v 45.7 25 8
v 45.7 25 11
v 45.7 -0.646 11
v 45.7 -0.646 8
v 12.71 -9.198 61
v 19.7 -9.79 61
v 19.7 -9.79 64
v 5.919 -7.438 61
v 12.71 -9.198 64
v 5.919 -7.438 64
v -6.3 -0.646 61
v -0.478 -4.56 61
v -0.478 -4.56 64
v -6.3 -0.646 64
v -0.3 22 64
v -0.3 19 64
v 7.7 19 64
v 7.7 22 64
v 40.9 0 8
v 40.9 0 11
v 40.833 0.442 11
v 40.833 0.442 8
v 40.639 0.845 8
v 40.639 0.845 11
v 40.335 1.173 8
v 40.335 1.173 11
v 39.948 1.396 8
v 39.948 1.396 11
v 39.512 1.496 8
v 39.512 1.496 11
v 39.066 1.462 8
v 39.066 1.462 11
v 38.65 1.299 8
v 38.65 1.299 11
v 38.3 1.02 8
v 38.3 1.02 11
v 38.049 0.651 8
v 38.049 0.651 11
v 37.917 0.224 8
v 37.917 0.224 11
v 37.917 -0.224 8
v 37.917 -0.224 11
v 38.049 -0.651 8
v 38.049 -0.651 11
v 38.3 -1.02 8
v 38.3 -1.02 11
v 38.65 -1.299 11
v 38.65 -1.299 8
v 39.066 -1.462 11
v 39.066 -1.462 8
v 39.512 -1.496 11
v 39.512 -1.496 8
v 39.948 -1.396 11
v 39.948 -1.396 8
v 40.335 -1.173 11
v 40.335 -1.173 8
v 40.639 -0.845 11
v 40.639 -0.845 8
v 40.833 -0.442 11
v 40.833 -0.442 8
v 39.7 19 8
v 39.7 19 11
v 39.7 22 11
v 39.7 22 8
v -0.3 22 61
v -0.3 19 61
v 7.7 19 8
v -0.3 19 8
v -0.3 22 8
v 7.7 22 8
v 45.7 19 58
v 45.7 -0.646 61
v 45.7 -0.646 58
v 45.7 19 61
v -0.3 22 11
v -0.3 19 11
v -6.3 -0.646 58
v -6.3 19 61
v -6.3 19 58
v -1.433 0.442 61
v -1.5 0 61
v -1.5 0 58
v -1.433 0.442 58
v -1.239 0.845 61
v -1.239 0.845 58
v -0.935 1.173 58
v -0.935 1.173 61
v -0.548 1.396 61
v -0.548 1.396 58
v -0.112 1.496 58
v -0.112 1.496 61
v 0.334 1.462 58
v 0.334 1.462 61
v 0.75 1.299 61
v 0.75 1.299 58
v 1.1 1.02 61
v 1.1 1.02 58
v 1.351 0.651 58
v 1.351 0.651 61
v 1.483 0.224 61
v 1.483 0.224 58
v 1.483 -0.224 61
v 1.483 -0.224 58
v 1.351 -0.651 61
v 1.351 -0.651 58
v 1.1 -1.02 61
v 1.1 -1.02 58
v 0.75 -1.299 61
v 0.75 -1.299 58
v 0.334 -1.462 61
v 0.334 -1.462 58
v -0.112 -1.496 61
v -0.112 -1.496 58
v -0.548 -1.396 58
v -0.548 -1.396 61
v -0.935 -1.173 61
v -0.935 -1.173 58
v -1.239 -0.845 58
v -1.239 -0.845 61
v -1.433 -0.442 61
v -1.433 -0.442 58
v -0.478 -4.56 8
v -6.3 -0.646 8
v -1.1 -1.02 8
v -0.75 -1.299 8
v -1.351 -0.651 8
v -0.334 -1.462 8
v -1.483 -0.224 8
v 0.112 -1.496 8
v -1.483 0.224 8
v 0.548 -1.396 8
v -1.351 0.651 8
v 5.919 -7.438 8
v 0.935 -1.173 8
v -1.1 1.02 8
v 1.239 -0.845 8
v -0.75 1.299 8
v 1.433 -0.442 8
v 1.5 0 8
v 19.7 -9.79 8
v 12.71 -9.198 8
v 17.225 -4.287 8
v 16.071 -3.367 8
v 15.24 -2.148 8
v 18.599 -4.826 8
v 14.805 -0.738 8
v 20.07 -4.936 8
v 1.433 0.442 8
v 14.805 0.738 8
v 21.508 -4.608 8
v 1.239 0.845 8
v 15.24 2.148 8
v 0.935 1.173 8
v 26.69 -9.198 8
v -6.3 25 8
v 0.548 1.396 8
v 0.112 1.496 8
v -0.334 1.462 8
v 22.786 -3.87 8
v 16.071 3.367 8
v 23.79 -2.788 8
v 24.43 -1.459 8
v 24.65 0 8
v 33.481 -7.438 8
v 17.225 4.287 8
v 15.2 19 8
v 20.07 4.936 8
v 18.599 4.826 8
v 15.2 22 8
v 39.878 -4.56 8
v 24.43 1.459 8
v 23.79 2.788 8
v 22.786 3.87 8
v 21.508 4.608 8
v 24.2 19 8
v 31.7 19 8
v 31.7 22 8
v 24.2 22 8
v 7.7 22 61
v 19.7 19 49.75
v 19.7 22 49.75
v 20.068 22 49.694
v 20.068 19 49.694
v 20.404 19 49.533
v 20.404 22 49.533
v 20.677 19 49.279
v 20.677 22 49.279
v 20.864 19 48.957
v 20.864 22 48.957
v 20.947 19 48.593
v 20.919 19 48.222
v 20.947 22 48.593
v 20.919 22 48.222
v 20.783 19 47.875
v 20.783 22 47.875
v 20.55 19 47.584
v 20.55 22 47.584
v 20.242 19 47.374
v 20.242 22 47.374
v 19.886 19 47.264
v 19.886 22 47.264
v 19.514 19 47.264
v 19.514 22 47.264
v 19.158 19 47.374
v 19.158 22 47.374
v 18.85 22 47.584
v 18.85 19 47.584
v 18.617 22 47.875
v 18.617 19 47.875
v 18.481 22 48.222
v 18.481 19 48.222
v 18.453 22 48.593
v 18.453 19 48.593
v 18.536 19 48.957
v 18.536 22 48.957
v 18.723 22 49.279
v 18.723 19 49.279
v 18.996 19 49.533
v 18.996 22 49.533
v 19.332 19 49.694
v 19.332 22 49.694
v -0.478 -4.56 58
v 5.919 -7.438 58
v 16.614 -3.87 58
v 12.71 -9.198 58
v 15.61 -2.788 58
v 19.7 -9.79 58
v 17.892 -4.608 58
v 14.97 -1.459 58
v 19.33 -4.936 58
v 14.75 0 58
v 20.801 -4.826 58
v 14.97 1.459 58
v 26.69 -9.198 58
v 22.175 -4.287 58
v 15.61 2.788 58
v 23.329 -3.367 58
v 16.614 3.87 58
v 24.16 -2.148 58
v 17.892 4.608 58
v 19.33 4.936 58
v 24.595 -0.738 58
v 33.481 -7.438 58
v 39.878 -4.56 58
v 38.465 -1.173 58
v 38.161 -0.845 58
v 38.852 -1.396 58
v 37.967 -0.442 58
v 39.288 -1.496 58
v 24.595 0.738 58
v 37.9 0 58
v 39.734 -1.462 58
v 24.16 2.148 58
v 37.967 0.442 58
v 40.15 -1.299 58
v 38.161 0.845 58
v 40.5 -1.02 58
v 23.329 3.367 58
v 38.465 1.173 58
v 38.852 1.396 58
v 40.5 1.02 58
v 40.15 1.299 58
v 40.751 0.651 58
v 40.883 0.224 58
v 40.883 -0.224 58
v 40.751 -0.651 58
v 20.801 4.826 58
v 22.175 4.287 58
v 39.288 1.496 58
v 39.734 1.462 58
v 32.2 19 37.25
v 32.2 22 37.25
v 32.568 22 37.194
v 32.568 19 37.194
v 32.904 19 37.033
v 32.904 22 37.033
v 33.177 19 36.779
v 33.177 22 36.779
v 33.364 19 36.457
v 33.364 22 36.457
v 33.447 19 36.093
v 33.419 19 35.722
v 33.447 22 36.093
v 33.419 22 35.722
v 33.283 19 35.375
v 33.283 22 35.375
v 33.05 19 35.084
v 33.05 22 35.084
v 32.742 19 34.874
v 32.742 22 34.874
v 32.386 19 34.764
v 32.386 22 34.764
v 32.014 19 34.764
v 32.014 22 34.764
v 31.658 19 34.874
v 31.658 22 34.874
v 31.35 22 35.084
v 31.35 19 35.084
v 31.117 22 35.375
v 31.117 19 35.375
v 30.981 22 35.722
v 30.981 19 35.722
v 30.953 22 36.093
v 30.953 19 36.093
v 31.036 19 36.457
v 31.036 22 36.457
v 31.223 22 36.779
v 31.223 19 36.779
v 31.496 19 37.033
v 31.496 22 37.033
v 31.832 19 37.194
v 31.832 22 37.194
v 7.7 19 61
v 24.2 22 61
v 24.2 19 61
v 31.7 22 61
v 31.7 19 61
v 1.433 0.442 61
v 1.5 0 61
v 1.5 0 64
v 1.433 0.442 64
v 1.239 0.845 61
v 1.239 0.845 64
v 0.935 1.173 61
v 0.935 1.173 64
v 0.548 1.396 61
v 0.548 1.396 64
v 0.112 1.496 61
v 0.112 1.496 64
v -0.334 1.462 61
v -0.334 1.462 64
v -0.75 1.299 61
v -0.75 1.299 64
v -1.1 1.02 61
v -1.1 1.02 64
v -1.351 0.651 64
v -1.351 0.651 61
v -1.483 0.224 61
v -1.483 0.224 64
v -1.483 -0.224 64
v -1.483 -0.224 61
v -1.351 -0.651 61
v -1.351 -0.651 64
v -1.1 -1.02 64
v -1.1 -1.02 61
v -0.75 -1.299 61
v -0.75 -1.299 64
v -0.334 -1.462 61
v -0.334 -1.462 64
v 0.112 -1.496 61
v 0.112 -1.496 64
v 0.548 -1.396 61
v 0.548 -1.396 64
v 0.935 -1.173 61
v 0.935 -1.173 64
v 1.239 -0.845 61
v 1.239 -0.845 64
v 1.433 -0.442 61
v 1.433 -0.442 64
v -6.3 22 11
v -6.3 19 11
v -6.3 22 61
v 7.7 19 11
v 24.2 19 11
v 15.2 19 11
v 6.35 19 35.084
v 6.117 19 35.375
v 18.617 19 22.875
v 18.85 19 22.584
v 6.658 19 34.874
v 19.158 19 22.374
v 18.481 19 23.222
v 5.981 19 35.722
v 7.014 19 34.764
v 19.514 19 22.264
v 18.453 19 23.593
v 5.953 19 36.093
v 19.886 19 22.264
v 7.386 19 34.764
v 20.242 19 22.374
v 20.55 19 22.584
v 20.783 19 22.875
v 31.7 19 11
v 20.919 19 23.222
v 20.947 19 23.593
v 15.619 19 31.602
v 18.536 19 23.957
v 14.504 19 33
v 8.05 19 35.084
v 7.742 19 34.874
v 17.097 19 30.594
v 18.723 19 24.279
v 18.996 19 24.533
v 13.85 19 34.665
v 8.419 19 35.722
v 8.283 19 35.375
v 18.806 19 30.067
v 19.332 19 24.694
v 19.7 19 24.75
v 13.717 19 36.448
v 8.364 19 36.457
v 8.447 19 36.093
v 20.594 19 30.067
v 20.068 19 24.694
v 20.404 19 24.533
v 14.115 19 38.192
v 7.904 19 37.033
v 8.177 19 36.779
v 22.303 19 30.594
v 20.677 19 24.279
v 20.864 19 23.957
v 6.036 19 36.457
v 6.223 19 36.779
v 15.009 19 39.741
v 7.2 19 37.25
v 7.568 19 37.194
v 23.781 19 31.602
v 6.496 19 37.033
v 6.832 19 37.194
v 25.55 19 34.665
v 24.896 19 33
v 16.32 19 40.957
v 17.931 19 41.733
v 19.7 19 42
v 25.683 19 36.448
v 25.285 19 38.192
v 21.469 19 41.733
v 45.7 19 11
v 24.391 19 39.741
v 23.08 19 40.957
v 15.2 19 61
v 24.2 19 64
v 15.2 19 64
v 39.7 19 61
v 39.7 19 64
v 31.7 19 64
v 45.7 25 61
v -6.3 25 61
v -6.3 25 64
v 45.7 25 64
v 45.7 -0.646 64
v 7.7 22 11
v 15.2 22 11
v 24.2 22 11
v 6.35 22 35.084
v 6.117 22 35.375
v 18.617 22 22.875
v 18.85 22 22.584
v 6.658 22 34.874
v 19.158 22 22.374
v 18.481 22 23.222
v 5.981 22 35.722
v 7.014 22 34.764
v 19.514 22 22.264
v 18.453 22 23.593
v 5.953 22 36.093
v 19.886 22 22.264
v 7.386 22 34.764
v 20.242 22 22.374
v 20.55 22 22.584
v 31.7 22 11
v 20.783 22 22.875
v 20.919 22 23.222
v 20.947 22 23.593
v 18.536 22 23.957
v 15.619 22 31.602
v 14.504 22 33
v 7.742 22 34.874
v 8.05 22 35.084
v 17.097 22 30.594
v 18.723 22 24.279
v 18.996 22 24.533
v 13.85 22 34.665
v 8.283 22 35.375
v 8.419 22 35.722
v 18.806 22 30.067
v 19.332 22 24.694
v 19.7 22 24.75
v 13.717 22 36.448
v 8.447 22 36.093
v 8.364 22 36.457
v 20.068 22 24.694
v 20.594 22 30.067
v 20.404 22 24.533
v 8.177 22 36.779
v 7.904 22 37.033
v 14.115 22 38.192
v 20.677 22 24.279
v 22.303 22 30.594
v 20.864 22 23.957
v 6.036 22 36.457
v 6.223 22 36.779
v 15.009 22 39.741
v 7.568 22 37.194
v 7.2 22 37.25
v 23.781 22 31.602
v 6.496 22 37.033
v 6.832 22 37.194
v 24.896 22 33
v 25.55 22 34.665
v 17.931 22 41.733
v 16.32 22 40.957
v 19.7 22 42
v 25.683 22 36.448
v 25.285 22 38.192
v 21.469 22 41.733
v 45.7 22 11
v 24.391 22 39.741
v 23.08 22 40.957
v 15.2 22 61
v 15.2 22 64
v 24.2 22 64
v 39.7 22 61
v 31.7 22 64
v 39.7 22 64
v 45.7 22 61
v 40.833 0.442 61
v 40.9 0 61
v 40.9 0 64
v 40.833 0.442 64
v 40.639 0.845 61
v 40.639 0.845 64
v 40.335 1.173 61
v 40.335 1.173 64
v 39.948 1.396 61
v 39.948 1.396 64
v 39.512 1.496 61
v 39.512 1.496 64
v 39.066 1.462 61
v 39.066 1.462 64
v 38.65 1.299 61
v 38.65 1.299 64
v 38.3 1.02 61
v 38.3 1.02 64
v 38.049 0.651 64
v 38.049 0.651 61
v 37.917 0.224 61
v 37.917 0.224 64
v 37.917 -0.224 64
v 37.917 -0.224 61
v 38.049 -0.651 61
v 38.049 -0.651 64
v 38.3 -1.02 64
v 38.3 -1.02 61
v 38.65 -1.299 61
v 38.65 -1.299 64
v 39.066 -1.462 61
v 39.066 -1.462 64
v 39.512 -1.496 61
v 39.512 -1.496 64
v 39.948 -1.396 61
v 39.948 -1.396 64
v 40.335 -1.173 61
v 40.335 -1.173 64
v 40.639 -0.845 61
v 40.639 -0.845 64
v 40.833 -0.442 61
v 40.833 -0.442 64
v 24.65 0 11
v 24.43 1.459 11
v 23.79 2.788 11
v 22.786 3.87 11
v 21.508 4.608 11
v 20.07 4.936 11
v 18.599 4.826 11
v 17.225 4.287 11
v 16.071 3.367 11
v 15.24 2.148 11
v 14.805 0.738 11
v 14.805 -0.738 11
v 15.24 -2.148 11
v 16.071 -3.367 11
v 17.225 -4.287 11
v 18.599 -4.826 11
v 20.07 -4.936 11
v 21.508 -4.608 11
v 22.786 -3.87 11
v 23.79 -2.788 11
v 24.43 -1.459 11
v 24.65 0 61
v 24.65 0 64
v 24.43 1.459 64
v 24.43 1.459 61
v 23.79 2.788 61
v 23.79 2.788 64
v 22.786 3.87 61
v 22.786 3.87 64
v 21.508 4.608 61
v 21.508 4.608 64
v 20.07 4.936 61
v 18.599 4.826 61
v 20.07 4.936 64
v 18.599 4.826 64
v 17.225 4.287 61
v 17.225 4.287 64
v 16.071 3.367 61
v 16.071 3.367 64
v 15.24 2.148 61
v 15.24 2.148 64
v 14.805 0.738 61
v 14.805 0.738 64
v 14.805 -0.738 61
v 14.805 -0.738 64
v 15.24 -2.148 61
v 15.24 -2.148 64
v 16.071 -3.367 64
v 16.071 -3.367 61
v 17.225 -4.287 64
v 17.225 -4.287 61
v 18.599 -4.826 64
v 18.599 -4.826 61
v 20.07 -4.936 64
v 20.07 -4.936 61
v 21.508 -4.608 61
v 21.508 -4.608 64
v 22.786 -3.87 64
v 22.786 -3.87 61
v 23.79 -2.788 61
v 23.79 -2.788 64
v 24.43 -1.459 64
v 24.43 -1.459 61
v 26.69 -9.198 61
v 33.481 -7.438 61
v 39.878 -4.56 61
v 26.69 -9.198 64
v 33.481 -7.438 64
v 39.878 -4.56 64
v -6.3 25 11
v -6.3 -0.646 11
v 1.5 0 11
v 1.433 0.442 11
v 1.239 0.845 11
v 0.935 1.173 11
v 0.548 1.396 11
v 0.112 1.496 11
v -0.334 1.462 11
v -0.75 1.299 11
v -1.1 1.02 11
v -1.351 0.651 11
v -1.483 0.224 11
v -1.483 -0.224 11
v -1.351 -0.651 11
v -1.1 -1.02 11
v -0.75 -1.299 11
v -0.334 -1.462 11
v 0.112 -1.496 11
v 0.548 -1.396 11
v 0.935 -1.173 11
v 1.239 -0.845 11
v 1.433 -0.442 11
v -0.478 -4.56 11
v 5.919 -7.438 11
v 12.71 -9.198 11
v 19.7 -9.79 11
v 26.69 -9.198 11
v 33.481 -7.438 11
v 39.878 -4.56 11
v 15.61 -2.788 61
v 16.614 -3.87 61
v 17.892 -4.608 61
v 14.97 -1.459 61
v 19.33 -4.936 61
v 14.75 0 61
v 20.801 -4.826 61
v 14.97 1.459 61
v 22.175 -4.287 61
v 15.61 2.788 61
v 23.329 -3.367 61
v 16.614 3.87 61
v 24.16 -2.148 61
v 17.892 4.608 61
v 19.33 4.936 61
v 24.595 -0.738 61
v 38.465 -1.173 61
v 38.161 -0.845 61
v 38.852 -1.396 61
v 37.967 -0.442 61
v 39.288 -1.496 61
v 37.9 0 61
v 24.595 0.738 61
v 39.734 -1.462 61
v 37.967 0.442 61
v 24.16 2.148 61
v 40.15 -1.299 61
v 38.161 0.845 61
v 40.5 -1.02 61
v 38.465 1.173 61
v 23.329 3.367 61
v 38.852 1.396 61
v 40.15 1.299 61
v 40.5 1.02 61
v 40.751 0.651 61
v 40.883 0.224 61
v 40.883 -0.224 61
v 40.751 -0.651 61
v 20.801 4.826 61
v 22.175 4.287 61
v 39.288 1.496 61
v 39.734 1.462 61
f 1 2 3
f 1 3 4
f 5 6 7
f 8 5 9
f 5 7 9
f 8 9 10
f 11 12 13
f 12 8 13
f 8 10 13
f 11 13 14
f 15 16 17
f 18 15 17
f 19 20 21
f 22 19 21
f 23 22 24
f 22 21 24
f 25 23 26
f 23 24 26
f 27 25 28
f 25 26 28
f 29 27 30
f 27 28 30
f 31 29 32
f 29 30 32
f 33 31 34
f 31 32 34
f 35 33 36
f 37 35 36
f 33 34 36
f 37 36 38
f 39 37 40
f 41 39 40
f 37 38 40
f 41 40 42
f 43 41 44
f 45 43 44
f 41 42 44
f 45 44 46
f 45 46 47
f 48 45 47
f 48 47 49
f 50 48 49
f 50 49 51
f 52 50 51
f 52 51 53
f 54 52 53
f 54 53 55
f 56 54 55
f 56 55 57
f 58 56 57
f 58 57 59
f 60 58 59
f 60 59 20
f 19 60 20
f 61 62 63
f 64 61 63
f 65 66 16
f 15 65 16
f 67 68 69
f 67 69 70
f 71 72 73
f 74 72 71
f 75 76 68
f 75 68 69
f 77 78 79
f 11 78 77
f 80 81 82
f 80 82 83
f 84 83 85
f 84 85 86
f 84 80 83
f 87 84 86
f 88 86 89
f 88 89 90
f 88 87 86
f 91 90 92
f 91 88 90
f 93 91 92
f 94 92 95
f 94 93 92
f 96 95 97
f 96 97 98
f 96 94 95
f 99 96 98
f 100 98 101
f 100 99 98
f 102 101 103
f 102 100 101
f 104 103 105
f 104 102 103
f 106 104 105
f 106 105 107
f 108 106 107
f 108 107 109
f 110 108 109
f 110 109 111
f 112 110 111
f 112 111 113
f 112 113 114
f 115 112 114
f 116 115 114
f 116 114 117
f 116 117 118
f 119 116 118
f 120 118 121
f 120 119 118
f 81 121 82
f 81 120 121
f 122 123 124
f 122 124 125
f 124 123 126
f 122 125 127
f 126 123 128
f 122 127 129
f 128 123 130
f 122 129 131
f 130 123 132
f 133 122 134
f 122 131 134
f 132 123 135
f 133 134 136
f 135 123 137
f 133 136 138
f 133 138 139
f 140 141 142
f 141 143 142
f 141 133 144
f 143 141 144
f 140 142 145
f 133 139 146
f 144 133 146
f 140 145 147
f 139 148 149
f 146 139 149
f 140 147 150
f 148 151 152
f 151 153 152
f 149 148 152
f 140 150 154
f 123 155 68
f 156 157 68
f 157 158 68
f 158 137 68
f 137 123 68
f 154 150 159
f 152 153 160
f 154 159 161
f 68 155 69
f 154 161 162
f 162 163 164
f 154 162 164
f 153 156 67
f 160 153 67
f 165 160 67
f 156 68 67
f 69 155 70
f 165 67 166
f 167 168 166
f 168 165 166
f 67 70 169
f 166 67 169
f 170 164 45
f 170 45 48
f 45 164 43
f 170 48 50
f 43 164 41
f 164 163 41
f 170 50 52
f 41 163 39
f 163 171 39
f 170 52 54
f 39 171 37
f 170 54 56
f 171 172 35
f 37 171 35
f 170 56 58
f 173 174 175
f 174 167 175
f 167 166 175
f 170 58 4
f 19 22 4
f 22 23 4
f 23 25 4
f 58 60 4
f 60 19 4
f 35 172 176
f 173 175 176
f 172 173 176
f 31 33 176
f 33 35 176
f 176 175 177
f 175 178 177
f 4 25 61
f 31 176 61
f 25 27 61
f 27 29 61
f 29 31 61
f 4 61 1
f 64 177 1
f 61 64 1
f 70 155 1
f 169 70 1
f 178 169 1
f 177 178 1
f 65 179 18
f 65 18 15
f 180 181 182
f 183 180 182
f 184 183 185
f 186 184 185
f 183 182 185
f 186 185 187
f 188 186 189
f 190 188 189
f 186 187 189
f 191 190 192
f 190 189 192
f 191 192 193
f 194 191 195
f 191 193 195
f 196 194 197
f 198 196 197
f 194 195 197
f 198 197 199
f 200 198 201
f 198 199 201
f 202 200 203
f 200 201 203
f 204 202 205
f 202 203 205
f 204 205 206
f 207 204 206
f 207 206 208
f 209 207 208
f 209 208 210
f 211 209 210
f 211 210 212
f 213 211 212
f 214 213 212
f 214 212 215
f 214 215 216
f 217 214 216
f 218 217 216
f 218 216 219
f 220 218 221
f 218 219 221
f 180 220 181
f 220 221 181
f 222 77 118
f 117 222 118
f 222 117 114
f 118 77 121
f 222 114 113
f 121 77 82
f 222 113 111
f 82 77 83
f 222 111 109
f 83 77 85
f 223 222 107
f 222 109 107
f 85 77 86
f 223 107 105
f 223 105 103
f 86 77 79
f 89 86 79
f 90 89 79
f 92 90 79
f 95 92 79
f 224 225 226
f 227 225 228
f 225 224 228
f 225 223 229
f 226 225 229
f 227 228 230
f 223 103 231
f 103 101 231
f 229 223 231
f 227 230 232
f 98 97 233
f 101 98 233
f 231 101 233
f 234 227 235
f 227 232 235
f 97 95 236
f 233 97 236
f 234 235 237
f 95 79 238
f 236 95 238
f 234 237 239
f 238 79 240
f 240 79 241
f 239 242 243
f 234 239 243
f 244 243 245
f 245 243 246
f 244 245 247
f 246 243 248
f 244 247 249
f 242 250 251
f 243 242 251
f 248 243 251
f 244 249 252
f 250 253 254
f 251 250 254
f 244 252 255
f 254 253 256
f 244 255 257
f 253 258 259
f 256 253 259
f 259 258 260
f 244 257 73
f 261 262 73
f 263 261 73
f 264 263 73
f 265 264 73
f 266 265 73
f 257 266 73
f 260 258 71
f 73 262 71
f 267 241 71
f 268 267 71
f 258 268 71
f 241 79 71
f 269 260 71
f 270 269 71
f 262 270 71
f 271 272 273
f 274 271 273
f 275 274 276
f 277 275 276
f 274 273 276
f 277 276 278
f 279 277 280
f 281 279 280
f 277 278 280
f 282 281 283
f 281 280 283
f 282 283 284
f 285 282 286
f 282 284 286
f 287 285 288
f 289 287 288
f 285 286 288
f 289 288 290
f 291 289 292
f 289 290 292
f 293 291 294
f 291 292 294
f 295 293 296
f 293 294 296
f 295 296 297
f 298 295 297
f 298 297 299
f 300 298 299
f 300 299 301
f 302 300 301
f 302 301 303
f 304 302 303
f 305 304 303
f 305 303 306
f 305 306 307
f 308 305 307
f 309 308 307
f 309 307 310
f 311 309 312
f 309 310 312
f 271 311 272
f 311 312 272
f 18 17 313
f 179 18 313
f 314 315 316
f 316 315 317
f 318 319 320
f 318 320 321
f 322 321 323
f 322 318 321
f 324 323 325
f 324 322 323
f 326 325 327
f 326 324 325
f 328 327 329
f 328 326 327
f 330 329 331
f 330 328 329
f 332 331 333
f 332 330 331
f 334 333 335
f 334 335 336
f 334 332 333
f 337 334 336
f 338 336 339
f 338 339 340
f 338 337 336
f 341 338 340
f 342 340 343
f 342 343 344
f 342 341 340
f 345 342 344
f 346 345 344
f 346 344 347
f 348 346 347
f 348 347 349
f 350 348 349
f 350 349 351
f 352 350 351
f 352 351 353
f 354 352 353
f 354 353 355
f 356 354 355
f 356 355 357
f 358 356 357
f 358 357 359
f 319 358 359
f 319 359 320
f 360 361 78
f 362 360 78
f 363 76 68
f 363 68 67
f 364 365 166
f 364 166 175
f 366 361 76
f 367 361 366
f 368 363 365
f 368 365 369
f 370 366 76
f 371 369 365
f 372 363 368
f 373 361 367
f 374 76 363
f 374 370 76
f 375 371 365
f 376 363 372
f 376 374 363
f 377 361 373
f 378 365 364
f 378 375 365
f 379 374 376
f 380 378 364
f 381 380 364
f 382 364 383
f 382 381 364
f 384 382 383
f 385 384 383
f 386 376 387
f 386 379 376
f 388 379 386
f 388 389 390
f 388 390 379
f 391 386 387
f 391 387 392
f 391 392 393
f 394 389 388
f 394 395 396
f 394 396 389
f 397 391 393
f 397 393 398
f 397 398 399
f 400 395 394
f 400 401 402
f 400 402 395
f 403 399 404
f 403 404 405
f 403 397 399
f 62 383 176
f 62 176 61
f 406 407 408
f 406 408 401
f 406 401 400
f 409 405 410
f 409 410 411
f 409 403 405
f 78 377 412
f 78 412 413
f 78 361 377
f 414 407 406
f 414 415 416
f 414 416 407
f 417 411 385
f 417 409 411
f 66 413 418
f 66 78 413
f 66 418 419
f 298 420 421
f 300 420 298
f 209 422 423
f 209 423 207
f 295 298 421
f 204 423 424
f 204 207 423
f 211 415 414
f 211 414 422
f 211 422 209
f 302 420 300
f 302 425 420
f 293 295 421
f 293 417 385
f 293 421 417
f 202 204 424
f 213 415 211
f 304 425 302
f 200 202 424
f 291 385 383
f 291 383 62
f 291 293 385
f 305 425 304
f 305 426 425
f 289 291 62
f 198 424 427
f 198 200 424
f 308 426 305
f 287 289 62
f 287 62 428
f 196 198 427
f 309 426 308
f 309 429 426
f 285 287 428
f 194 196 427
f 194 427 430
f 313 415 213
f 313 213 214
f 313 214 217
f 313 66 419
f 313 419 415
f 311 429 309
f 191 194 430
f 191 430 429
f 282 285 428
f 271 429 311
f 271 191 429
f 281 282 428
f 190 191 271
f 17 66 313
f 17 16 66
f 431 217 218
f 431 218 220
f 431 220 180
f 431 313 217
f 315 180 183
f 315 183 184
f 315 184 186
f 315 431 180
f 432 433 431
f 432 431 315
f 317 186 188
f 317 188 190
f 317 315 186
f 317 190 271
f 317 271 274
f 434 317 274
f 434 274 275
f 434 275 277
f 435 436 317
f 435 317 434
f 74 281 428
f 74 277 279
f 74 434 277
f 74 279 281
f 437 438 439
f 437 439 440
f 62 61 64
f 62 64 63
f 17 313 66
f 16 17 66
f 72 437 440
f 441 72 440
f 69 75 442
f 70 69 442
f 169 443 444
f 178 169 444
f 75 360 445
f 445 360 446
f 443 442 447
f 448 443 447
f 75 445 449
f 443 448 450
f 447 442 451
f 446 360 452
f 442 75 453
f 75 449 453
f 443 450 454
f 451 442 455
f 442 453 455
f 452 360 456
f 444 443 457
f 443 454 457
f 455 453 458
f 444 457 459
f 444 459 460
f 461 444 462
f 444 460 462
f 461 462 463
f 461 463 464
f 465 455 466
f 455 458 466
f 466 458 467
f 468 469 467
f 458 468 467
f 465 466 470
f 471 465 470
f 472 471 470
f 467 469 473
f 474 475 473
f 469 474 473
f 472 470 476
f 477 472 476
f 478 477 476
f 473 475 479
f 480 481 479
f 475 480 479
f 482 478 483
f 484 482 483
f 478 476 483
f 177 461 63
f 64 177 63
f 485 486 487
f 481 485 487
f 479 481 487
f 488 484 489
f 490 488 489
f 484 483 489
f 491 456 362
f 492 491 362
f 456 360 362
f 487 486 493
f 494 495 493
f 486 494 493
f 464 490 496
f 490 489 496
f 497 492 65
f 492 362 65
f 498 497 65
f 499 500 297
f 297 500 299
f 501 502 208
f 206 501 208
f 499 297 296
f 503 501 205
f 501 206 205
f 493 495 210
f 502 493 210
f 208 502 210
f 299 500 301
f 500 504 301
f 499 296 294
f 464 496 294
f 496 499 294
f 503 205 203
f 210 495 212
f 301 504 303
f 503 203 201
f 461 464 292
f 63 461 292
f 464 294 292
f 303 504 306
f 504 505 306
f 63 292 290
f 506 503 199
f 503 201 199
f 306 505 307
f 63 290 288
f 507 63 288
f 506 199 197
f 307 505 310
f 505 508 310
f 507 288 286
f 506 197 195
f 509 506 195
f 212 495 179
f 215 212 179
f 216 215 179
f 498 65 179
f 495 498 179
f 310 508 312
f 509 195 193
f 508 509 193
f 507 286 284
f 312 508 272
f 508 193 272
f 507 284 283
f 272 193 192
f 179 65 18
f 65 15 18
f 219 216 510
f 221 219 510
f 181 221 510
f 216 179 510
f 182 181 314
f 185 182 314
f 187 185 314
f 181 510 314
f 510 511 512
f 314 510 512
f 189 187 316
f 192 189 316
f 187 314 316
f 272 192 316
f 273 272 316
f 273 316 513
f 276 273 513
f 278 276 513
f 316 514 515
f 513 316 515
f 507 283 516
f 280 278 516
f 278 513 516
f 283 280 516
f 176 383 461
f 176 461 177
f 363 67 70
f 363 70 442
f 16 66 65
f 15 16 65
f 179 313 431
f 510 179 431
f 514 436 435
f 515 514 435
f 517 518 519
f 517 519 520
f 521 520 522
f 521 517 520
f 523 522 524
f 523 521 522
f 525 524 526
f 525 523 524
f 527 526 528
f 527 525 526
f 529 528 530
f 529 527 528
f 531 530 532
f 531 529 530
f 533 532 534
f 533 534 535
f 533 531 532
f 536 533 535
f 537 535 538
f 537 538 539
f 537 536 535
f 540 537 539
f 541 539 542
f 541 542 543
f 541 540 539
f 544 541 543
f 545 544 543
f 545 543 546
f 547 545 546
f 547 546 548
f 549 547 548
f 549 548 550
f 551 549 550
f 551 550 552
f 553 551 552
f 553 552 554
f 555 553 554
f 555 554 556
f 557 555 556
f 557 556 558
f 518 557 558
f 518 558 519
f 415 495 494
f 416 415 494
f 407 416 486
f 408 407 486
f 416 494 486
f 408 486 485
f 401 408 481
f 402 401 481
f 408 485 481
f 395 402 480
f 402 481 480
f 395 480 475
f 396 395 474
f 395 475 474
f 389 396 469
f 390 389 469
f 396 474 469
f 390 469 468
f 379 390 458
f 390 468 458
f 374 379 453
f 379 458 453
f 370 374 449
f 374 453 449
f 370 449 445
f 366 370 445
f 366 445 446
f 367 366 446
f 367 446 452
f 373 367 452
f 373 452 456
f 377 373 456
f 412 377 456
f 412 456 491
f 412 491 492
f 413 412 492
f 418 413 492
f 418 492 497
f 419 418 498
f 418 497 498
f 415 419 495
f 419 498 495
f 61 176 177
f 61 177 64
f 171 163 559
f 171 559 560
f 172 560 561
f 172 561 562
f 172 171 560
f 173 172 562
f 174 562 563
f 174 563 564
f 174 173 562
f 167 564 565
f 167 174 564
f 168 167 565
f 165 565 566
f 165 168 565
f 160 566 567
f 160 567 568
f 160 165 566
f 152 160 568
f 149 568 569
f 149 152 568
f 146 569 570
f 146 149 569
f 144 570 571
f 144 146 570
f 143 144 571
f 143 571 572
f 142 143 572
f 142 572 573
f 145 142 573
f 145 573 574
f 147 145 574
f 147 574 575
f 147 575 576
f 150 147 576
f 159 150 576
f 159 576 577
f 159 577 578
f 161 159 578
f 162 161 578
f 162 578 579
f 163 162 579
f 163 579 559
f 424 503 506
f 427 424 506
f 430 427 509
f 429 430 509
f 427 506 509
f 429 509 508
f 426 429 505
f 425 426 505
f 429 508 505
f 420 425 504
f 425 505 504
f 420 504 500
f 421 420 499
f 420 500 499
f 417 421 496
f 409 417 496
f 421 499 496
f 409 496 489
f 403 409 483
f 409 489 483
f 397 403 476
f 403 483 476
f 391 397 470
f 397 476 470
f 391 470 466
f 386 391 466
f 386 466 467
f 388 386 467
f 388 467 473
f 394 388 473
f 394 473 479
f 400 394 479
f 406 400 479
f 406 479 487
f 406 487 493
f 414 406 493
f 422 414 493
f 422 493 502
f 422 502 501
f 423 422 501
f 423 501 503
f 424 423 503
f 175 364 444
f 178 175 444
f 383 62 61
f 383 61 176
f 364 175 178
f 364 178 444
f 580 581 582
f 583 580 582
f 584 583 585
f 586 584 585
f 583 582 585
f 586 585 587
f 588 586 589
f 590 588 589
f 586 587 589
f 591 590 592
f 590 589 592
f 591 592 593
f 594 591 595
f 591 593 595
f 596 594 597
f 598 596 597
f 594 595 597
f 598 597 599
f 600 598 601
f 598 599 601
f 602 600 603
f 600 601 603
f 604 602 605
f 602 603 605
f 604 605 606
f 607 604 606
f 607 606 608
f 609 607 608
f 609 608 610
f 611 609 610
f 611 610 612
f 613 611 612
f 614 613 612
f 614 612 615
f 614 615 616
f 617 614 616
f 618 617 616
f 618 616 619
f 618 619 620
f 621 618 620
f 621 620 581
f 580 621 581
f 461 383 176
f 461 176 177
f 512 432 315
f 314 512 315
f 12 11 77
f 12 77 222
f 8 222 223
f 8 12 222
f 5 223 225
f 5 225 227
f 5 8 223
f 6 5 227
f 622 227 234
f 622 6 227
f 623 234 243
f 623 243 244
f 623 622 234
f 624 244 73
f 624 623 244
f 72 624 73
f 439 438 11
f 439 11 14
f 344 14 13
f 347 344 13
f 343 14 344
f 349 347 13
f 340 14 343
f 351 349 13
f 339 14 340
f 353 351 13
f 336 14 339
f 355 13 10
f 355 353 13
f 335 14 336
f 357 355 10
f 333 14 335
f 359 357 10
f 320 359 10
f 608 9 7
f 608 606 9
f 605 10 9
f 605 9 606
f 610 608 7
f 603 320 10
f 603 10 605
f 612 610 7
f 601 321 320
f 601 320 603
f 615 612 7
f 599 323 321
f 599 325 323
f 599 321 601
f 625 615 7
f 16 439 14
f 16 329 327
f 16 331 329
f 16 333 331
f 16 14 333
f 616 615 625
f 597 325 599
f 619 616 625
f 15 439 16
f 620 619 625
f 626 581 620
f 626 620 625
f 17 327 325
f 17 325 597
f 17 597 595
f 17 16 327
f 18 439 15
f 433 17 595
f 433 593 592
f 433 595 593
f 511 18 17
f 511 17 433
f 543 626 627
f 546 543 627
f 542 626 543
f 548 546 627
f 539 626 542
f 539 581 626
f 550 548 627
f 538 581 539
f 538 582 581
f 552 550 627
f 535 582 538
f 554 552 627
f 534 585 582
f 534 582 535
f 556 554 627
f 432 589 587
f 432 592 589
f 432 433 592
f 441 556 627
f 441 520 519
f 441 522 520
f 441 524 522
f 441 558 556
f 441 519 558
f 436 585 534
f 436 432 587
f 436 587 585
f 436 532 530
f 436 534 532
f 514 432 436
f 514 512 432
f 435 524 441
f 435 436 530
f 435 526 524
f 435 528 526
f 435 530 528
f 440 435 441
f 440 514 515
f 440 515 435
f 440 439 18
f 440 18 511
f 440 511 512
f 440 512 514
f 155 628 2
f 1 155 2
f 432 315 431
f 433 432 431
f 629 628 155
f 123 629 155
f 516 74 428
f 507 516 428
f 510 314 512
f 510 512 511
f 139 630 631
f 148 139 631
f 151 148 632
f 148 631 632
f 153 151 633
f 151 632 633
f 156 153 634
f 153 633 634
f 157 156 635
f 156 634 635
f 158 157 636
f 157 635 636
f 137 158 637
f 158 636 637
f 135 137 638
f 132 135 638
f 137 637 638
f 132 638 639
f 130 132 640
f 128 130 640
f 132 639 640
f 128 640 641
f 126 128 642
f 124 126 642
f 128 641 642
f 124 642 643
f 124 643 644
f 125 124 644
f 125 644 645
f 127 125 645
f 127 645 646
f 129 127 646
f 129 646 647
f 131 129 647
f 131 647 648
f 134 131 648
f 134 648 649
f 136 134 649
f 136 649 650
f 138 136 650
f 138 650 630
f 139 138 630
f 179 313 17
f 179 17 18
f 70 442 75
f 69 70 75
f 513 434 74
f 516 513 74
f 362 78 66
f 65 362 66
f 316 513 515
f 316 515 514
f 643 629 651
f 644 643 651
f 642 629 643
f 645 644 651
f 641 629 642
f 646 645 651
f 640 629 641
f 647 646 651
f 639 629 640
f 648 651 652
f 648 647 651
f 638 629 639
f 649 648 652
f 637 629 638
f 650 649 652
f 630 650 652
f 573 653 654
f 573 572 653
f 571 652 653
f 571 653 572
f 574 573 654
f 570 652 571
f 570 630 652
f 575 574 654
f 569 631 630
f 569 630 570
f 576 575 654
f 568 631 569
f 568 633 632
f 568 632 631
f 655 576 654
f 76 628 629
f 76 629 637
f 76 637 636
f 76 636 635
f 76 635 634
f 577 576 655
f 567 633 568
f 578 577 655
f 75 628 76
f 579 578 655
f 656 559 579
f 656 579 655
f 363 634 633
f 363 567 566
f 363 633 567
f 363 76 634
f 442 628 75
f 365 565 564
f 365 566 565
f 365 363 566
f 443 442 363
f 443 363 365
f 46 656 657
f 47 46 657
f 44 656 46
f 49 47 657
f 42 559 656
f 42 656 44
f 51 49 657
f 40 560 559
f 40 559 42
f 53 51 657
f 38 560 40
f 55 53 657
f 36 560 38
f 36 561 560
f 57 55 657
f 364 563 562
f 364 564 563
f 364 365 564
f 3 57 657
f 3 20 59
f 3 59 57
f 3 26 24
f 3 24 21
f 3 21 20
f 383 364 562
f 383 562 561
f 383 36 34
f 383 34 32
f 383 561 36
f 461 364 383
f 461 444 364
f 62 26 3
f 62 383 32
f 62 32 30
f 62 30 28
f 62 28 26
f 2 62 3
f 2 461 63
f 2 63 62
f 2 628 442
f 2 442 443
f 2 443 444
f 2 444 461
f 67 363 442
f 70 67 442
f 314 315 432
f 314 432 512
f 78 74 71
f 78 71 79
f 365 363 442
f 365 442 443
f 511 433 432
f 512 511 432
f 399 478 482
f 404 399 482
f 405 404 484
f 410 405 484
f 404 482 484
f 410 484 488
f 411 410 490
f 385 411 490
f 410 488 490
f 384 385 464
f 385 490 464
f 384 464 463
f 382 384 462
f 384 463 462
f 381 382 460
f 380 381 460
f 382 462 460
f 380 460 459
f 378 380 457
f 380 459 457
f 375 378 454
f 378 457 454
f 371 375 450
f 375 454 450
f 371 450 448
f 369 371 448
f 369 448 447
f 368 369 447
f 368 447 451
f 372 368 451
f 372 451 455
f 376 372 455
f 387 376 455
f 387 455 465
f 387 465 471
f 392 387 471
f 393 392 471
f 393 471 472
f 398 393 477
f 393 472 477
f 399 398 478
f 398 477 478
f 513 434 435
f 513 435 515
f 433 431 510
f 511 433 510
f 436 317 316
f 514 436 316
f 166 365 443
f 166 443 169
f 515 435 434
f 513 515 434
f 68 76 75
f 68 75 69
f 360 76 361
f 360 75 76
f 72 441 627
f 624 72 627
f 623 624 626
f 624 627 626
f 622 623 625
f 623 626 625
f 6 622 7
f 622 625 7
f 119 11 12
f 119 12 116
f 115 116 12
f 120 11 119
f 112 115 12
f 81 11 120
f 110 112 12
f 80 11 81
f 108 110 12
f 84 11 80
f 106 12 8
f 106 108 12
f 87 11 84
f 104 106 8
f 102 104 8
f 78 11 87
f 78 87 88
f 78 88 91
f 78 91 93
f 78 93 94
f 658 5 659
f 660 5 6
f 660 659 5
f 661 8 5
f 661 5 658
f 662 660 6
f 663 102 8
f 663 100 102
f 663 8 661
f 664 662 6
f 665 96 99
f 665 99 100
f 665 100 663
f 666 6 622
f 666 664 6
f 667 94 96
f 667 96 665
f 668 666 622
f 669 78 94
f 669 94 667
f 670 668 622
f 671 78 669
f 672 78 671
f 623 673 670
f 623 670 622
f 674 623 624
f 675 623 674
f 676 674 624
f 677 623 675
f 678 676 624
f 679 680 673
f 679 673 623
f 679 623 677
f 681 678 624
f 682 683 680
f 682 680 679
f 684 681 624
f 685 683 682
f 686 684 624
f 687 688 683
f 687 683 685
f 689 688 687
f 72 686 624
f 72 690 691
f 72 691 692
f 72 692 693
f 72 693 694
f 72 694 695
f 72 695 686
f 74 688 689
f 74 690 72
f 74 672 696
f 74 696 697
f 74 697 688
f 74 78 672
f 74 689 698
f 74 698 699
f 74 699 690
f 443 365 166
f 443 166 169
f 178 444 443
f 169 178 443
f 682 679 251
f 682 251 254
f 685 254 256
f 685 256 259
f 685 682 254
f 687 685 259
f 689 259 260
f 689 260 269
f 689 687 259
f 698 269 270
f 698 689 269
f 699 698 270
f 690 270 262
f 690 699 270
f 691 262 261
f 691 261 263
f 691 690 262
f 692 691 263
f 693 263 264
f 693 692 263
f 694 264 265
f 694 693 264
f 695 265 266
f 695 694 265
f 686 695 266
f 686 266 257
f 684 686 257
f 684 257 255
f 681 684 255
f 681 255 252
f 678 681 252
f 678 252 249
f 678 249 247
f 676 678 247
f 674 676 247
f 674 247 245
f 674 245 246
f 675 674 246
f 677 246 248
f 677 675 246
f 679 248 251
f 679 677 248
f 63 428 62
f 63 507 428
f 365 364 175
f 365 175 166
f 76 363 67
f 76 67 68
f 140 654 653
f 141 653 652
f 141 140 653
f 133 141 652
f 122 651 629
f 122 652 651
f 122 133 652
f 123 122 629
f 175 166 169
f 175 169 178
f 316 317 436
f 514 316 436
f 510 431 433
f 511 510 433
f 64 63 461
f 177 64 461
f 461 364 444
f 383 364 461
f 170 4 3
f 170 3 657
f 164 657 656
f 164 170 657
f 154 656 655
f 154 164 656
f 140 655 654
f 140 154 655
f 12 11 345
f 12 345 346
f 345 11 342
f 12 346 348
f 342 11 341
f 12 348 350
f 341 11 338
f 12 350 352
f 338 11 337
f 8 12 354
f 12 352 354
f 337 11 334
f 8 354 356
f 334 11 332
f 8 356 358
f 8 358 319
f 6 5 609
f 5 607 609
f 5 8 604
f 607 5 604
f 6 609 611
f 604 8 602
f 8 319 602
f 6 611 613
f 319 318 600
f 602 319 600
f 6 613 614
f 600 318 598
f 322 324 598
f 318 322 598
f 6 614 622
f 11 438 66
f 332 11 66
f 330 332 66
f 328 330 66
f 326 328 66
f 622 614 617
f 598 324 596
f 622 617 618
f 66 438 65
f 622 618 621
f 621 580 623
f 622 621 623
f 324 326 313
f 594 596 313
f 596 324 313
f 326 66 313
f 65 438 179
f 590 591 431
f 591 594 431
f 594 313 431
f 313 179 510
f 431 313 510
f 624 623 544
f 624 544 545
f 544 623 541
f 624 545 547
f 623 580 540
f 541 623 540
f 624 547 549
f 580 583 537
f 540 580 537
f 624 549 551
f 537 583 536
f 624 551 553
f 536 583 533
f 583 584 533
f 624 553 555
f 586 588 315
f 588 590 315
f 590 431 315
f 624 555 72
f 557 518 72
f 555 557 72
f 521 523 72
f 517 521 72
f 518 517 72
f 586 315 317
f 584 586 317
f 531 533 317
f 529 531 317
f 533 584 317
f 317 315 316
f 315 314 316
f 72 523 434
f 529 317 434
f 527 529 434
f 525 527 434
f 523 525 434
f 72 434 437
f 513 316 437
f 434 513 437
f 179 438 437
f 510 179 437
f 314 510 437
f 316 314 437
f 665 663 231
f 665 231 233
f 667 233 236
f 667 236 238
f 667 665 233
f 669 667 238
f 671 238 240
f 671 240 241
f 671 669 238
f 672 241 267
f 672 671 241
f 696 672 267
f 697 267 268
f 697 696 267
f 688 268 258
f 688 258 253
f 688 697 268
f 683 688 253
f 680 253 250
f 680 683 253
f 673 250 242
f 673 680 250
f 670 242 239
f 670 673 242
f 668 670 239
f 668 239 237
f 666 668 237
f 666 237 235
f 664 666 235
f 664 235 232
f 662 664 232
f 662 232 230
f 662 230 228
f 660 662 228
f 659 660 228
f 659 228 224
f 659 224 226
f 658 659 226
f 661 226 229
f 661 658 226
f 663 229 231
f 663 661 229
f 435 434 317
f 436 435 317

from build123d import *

# Parameters (mm, degrees)
SKETCH_1_R                = 1.5
SKETCH_1_R_2              = 2.5
EXTRUDE_1_DEPTH           = 3
EXTRUDE_START             = -5
SKETCH_2_R                = 2.5
SKETCH_2_R_2              = 1.5
EXTRUDE_6_DEPTH           = 5
SKETCH_5_W                = 62
SKETCH_5_H                = 30
CUT_EXTRUDE_1_DEPTH       = 2
SKETCH_6_W                = 10
SKETCH_6_H                = 3
CUT_EXTRUDE_2_DEPTH       = 10
SKETCH_8_W                = 5
SKETCH_8_H                = 30
CUT_EXTRUDE_3_DEPTH       = 13
PATTERN_LINEAR_1_COUNT    = 2
PATTERN_LINEAR_1_PITCH    = 61
CUT_EXTRUDE_9_DEPTH       = 3
CUT_EXTRUDE_10_DEPTH      = 78.681979892
CUT_EXTRUDE_10_DEPTH_BACK = 3
SKETCH_14_W               = 10
SKETCH_14_H               = 3
EXTRUDE_7_DEPTH           = 3
SKETCH_16_W               = 52
SKETCH_16_H               = 3
EXTRUDE_8_DEPTH           = 10
SKETCH_17_W               = 52
SKETCH_17_H               = 3
EXTRUDE_9_DEPTH           = 10
SKETCH_18_W               = 8
SKETCH_18_H               = 3
SKETCH_18_W_2             = 9
CUT_EXTRUDE_11_DEPTH      = 92
EXTRUDE_10_DEPTH          = 3
EXTRUDE_11_DEPTH          = 3
SKETCH_22_W               = 186.911314513
SKETCH_22_H               = 209.890351
CUT_EXTRUDE_12_DEPTH      = 32
SKETCH_23_W               = 36
SKETCH_23_H               = 45.580870686
CUT_EXTRUDE_13_DEPTH      = 32
SKETCH_24_R               = 6
CUT_EXTRUDE_14_DEPTH      = 70
SKETCH_25_R               = 1.25
CUT_EXTRUDE_15_DEPTH      = 70
SKETCH_26_R               = 4.95
CUT_EXTRUDE_16_DEPTH      = 70
SKETCH_27_W               = 3
SKETCH_27_H               = 22.790435343
EXTRUDE_12_DEPTH          = 2
SKETCH_28_W               = 3
SKETCH_28_H               = 22.790435343
EXTRUDE_13_DEPTH          = 2
SKETCH_29_W               = 52
SKETCH_29_H               = 3
EXTRUDE_14_DEPTH          = 2
SKETCH_30_W               = 20
SKETCH_30_H               = 3
EXTRUDE_15_DEPTH          = 2
CUT_EXTRUDE_18_DEPTH      = 12
CUT_EXTRUDE_START         = -12
CUT_EXTRUDE_19_DEPTH      = 12
SKETCH_33_R               = 17.058294543
EXTRUDE_16_DEPTH          = 3
SKETCH_34_R               = 56.337564476
CUT_EXTRUDE_20_DEPTH      = 7
CUT_EXTRUDE_START_2       = -5
CUT_EXTRUDE_21_DEPTH      = 5
CUT_EXTRUDE_23_DEPTH      = 5
SKETCH_39_R               = 6
CUT_EXTRUDE_24_DEPTH      = 5
SKETCH_40_R               = 1.5
SKETCH_40_R_2             = 4.95
EXTRUDE_17_DEPTH          = 3
SKETCH_41_R               = 1.25
CUT_EXTRUDE_25_DEPTH      = 3


with BuildPart() as part:
    # 草图1 → 凸台-拉伸1 (new body)
    with BuildSketch(Plane.XY):
        with BuildLine():
            Line((-5.3, 6), (44.7, 6))
            ThreePointArc((44.7, 6), (50.7, 0), (44.7, -6))
            Line((44.7, -6), (-5.3, -6))
            ThreePointArc((-5.3, -6), (-11.3, 0), (-5.3, 6))
        make_face()
        Circle(SKETCH_1_R, mode=Mode.SUBTRACT)
        with Locations((39.4, 0)):
            Circle(SKETCH_1_R, mode=Mode.SUBTRACT)
        with Locations((19.7, 0)):
            Circle(SKETCH_1_R_2, mode=Mode.SUBTRACT)
    extrude(amount=EXTRUDE_1_DEPTH)

    # 草图2 → 凸台-拉伸6 (add)
    # profile 1 of 3: a face of its own
    with BuildSketch(Plane.XY.offset(3).offset(EXTRUDE_START)):
        with BuildLine():
            Line((-11.3, 15), (-11.3, 3.3e-08))
            ThreePointArc((-11.3, 3.3e-08), (-9.542640675, 4.242640699), (-5.3, 6))
            Line((-5.3, 6), (44.7, 6))
            ThreePointArc((44.7, 6), (48.942640687, 4.242640687), (50.7, 0))
            Line((50.7, 0), (50.7, 15))
            Line((50.7, 15), (-11.3, 15))
        make_face()
    # profile 2 of 3: a face of its own
    with BuildSketch(Plane.XY.offset(3).offset(EXTRUDE_START)):
        with BuildLine():
            Line((44.7, 6), (-5.3, 6))
            ThreePointArc((-5.3, 6), (-11.3, 0), (-5.3, -6))
            Line((-5.3, -6), (44.7, -6))
            ThreePointArc((44.7, -6), (50.7, 0), (44.7, 6))
        make_face()
        with Locations((19.7, 0)):
            Circle(SKETCH_2_R, mode=Mode.SUBTRACT)
        Circle(SKETCH_2_R_2, mode=Mode.SUBTRACT)
        with Locations((39.4, 0)):
            Circle(SKETCH_2_R_2, mode=Mode.SUBTRACT)
    # profile 3 of 3: a face of its own
    with BuildSketch(Plane.XY.offset(3).offset(EXTRUDE_START)):
        with BuildLine():
            Line((-11.3, 3.3e-08), (-11.3, -15))
            Line((-11.3, -15), (50.7, -15))
            Line((50.7, -15), (50.7, 0))
            ThreePointArc((50.7, 0), (48.942640687, -4.242640687), (44.7, -6))
            Line((44.7, -6), (-5.3, -6))
            ThreePointArc((-5.3, -6), (-9.542640699, -4.242640675), (-11.3, 3.3e-08))
        make_face()
    extrude(amount=EXTRUDE_6_DEPTH)

    # 草图5 → 切除-拉伸1 (cut)
    with BuildSketch(Plane(origin=(0, 0, -2), x_dir=(-1, 0, 0), z_dir=(0, 0, -1))):
        with Locations((-19.7, 0)):
            Rectangle(SKETCH_5_W, SKETCH_5_H)
    extrude(amount=-CUT_EXTRUDE_1_DEPTH, mode=Mode.SUBTRACT)

    # 草图6 → 切除-拉伸2 (cut)
    with BuildSketch(Plane(origin=(0, 0, 0), x_dir=(-1, 0, 0), z_dir=(0, 0, -1))):
        with Locations((-37.7, 10.5)):
            Rectangle(SKETCH_6_W, SKETCH_6_H)
        with Locations((-19.7, 10.5)):
            Rectangle(SKETCH_6_W, SKETCH_6_H)
        with Locations((-1.7, 10.5)):
            Rectangle(SKETCH_6_W, SKETCH_6_H)
    extrude(amount=-CUT_EXTRUDE_2_DEPTH, mode=Mode.SUBTRACT)

    # 草图8 → 切除-拉伸3 (cut)
    with BuildSketch(Plane.XY.offset(3)):
        with Locations((-8.8, 0)):
            Rectangle(SKETCH_8_W, SKETCH_8_H)
        with Locations((48.2, 0)):
            Rectangle(SKETCH_8_W, SKETCH_8_H)
    extrude(amount=-CUT_EXTRUDE_3_DEPTH, mode=Mode.SUBTRACT)


with BuildPart() as pattern_linear_1_1:
    # 阵列(线性)1: pattern copy
    add(part.part.moved(Location(Vector(0, 0, 1) * (1 * PATTERN_LINEAR_1_PITCH))))

    # 草图12 → 切除-拉伸9 (cut)
    with BuildSketch(Plane.XY.offset(64)):
        with BuildLine():
            Line((-6.3, -15), (19.7, -15))
            ThreePointArc((19.7, -15), (4.683324043, -10.971127107), (-6.3, 0.033370453))
            Line((-6.3, 0.033370453), (-6.3, -15))
        make_face()
        with BuildLine():
            Line((45.7, -15), (45.7, 0.033370453))
            ThreePointArc((45.7, 0.033370453), (34.716675957, -10.971127107), (19.7, -15))
            Line((19.7, -15), (45.7, -15))
        make_face()
    extrude(amount=-CUT_EXTRUDE_9_DEPTH, mode=Mode.SUBTRACT)


with BuildPart() as part_1:
    add(part.part)

    # 草图13 → 切除-拉伸10 (cut, two sides: drawn at the far end of the back side and taken through both)
    with BuildSketch(Plane.XY.offset(3).offset(-CUT_EXTRUDE_10_DEPTH_BACK)):
        with BuildLine():
            ThreePointArc((19.7, -15), (4.683324043, -10.971127107), (-6.3, 0.033370453))
            Line((-6.3, 0.033370453), (-6.3, -15))
            Line((-6.3, -15), (19.7, -15))
        make_face()
        with BuildLine():
            ThreePointArc((45.7, 0.033370453), (34.716675957, -10.971127107), (19.7, -15))
            Line((19.7, -15), (45.7, -15))
            Line((45.7, -15), (45.7, 0.033370453))
        make_face()
    extrude(amount=CUT_EXTRUDE_10_DEPTH + CUT_EXTRUDE_10_DEPTH_BACK, mode=Mode.SUBTRACT)

    add(pattern_linear_1_1.part)  # 凸台-拉伸7 merges 阵列(线性)1_1
    # 草图14 → 凸台-拉伸7 (add)
    with BuildSketch(Plane(origin=(0, 9, 0), x_dir=(1, 0, 0), z_dir=(0, 1, 0))):
        with Locations((37.7, -62.5)):
            Rectangle(SKETCH_14_W, SKETCH_14_H)
        with Locations((1.7, -1.5)):
            Rectangle(SKETCH_14_W, SKETCH_14_H)
        with Locations((19.7, -1.5)):
            Rectangle(SKETCH_14_W, SKETCH_14_H)
        with Locations((37.7, -1.5)):
            Rectangle(SKETCH_14_W, SKETCH_14_H)
        with Locations((1.7, -62.5)):
            Rectangle(SKETCH_14_W, SKETCH_14_H)
        with Locations((19.7, -62.5)):
            Rectangle(SKETCH_14_W, SKETCH_14_H)
    extrude(amount=EXTRUDE_7_DEPTH)

    # 草图16 → 凸台-拉伸8 (add)
    with BuildSketch(Plane(origin=(0, 15, 0), x_dir=(1, 0, 0), z_dir=(0, 1, 0))):
        with Locations((19.7, -62.5)):
            Rectangle(SKETCH_16_W, SKETCH_16_H)
    extrude(amount=EXTRUDE_8_DEPTH)

    # 草图17 → 凸台-拉伸9 (add)
    with BuildSketch(Plane(origin=(0, 15, 0), x_dir=(1, 0, 0), z_dir=(0, 1, 0))):
        with Locations((19.7, -1.5)):
            Rectangle(SKETCH_17_W, SKETCH_17_H)
    extrude(amount=EXTRUDE_9_DEPTH)

    # 草图18 → 切除-拉伸11 (cut)
    with BuildSketch(Plane(origin=(0, 0, 0), x_dir=(-1, 0, 0), z_dir=(0, 0, -1))):
        with Locations((-35.7, 20.5)):
            Rectangle(SKETCH_18_W, SKETCH_18_H)
        with Locations((-19.7, 20.5)):
            Rectangle(SKETCH_18_W_2, SKETCH_18_H)
        with Locations((-3.7, 20.5)):
            Rectangle(SKETCH_18_W, SKETCH_18_H)
    extrude(amount=-CUT_EXTRUDE_11_DEPTH, mode=Mode.SUBTRACT)

    # 草图21 → 凸台-拉伸11 (add)
    with BuildSketch(Plane.XY.offset(64)):
        Polygon((-6.3, 0.033370453), (-6.3, -7.790435343), (45.7, -7.790435343), (45.7, 0.033370453), (28.488176581, -6.055190285), (-2.858185747, -2.304821935), align=None)
    extrude(amount=-EXTRUDE_11_DEPTH)

    # 草图22 → 切除-拉伸12 (cut)
    with BuildSketch(Plane.XZ.offset(7.790435343)):
        with Locations((-1.99778524, 62.455941245)):
            Rectangle(SKETCH_22_W, SKETCH_22_H)
    extrude(amount=CUT_EXTRUDE_12_DEPTH, mode=Mode.SUBTRACT)

    # 草图23 → 切除-拉伸13 (cut)
    with BuildSketch(Plane(origin=(0, 0, 0), x_dir=(-1, 0, 0), z_dir=(0, 0, -1))):
        with Locations((-45.7, -7.790435343)):
            Rectangle(SKETCH_23_W, SKETCH_23_H)
        with Locations((6.3, -7.790435343)):
            Rectangle(SKETCH_23_W, SKETCH_23_H)
    extrude(amount=-CUT_EXTRUDE_13_DEPTH, mode=Mode.SUBTRACT)

    # 草图26 → 切除-拉伸16 (cut)
    with BuildSketch(Plane.XY.offset(64)):
        with Locations((19.7, 0)):
            Circle(SKETCH_26_R)
    extrude(amount=-CUT_EXTRUDE_16_DEPTH, mode=Mode.SUBTRACT)

    # 草图27 → 凸台-拉伸12 (add)
    with BuildSketch(Plane.ZY.offset(-11.7)):
        with Locations((1.5, 3.604782329)):
            Rectangle(SKETCH_27_W, SKETCH_27_H)
    extrude(amount=EXTRUDE_12_DEPTH)

    # 草图28 → 凸台-拉伸13 (add)
    with BuildSketch(Plane(origin=(27.7, 0, 0), x_dir=(0, 0, -1), z_dir=(1, 0, 0))):
        with Locations((-1.5, 3.604782329)):
            Rectangle(SKETCH_28_W, SKETCH_28_H)
    extrude(amount=EXTRUDE_13_DEPTH)

    # 草图29 → 凸台-拉伸14 (add)
    with BuildSketch(Plane.XZ.offset(7.790435343)):
        with Locations((19.7, 62.5)):
            Rectangle(SKETCH_29_W, SKETCH_29_H)
    extrude(amount=EXTRUDE_14_DEPTH)

    # 草图30 → 凸台-拉伸15 (add)
    with BuildSketch(Plane.XZ.offset(7.790435343)):
        with Locations((19.7, 1.5)):
            Rectangle(SKETCH_30_W, SKETCH_30_H)
    extrude(amount=EXTRUDE_15_DEPTH)

    # 草图31 → 切除-拉伸18 (cut)
    with BuildSketch(Plane.XY.offset(64)):
        with BuildLine():
            ThreePointArc((45.7, -0.646199916), (33.480575474, -7.437744554), (19.7, -9.790435343))
            Line((19.7, -9.790435343), (45.7, -9.790435343))
            Line((45.7, -9.790435343), (45.7, -0.646199916))
        make_face()
        with BuildLine():
            ThreePointArc((19.7, -9.790435343), (5.919424526, -7.437744554), (-6.3, -0.646199916))
            Line((-6.3, -0.646199916), (-6.3, -9.790435343))
            Line((-6.3, -9.790435343), (19.7, -9.790435343))
        make_face()
    extrude(amount=-CUT_EXTRUDE_18_DEPTH, mode=Mode.SUBTRACT)

    # 草图32 → 切除-拉伸19 (cut)
    with BuildSketch(Plane(origin=(0, 0, 0), x_dir=(-1, 0, 0), z_dir=(0, 0, -1)).offset(CUT_EXTRUDE_START)):
        with BuildLine():
            Line((-45.7, -0.646199916), (-43.950258349, -12.650491263))
            Line((-43.950258349, -12.650491263), (6.3, -16.622113536))
            Line((6.3, -16.622113536), (6.3, -0.646199916))
            ThreePointArc((6.3, -0.646199916), (-19.7, -9.790435343), (-45.7, -0.646199916))
        make_face()
    extrude(amount=CUT_EXTRUDE_19_DEPTH, mode=Mode.SUBTRACT)


with BuildPart() as body_2:
    # 草图19 → 凸台-拉伸10 (new body)
    with BuildSketch(Plane(origin=(0, 19, 0), x_dir=(1, 0, 0), z_dir=(0, 1, 0))):
        Polygon((39.7, -3), (39.7, 0), (31.7, 0), (31.7, -3), (24.2, -3), (24.2, 0), (15.2, 0), (15.2, -3), (7.7, -3), (7.7, 0), (-0.3, 0), (-0.3, -3), (-6.3, -3), (-6.3, -61), (-0.3, -61), (-0.3, -64), (7.7, -64), (7.7, -61), (15.2, -61), (15.2, -64), (24.2, -64), (24.2, -61), (31.7, -61), (31.7, -64), (39.7, -64), (39.7, -61), (45.7, -61), (45.7, -3), align=None)
    extrude(amount=EXTRUDE_10_DEPTH)

    # 草图24 → 切除-拉伸14 (cut)
    with BuildSketch(Plane(origin=(0, 22, 0), x_dir=(1, 0, 0), z_dir=(0, 1, 0))):
        with Locations(Location((19.7, -32, 0), (0, 0, 270))):
            Circle(SKETCH_24_R)
    extrude(amount=-CUT_EXTRUDE_14_DEPTH, mode=Mode.SUBTRACT)

    # 草图25 → 切除-拉伸15 (cut)
    with BuildSketch(Plane(origin=(0, 22, 0), x_dir=(1, 0, 0), z_dir=(0, 1, 0))):
        with Locations(Location((19.7, -19.5, 0), (0, 0, 270))):
            Circle(SKETCH_25_R)
        with Locations(Location((7.2, -32, 0), (0, 0, 270))):
            Circle(SKETCH_25_R)
        with Locations(Location((19.7, -44.5, 0), (0, 0, 270))):
            Circle(SKETCH_25_R)
        with Locations(Location((32.2, -32, 0), (0, 0, 270))):
            Circle(SKETCH_25_R)
    extrude(amount=-CUT_EXTRUDE_15_DEPTH, mode=Mode.SUBTRACT)

    # 草图33 → 凸台-拉伸16 (add)
    with BuildSketch(Plane(origin=(0, 22, 0), x_dir=(1, 0, 0), z_dir=(0, 1, 0))):
        with Locations((19.7, -32)):
            Circle(SKETCH_33_R)
    extrude(amount=-EXTRUDE_16_DEPTH)


with BuildPart() as cut_extrude_20_tool:
    # 草图34 → 切除-拉伸20 (new body)
    with BuildSketch(Plane(origin=(0, 0, 0), x_dir=(-1, 0, 0), z_dir=(0, 0, -1))):
        with Locations((-20.233447846, 12.47883322)):
            Circle(SKETCH_34_R)
    extrude(amount=-CUT_EXTRUDE_20_DEPTH)


with BuildPart() as part_2:
    add(part_1.part)

    # 切除-拉伸20: cut by cut_extrude_20_tool
    add(cut_extrude_20_tool.part, mode=Mode.SUBTRACT)


with BuildPart() as body_2_1:
    add(body_2.part)

    # 切除-拉伸20: cut by cut_extrude_20_tool
    add(cut_extrude_20_tool.part, mode=Mode.SUBTRACT)

    # 镜向1: body 2 across plane


with BuildPart() as body_2_2:
    add(body_2_1.part)
    add(body_2_1.part.mirror(Plane.XY.offset(34)))


with BuildPart() as body_3:
    # 镜向2: mirrored copy
    add(part_2.part.mirror(Plane.XY.offset(34)))


with BuildPart() as cut_extrude_21_tool:
    # 草图36 → 切除-拉伸21 (new body)
    with BuildSketch(Plane(origin=(0, 0, 4), x_dir=(-1, 0, 0), z_dir=(0, 0, -1)).offset(CUT_EXTRUDE_START_2)):
        with BuildLine():
            Line((6.3, -0.646199916), (6.3, 25))
            Line((6.3, 25), (-45.7, 25))
            Line((-45.7, 25), (-45.7, -0.646199916))
            ThreePointArc((-45.7, -0.646199916), (-19.7, -9.790435343), (6.3, -0.646199916))
        make_face()
    extrude(amount=CUT_EXTRUDE_21_DEPTH)


with BuildPart() as body_2_3:
    add(body_2_2.part)

    # 切除-拉伸21: cut by cut_extrude_21_tool
    add(cut_extrude_21_tool.part, mode=Mode.SUBTRACT)

    # 镜向3: body 2 across plane


with BuildPart() as body_3_1:
    add(body_3.part)

    # 切除-拉伸21: cut by cut_extrude_21_tool
    add(cut_extrude_21_tool.part, mode=Mode.SUBTRACT)


with BuildPart() as body_2_4:
    add(body_2_3.part)
    add(body_2_3.part.mirror(Plane(origin=(0, 0, 35), x_dir=(1, 0, 0), z_dir=(0, 0, -1))))


with BuildPart() as body_3_2:
    # 镜向4: mirrored copy
    add(part_2.part.mirror(Plane(origin=(0, 0, 35), x_dir=(1, 0, 0), z_dir=(0, 0, -1))))


with BuildPart() as cut_extrude_23_tool:
    # 草图38 → 切除-拉伸23 (new body)
    with BuildSketch(Plane(origin=(0, 0, 6), x_dir=(-1, 0, 0), z_dir=(0, 0, -1)).offset(CUT_EXTRUDE_START_2)):
        with BuildLine():
            Line((6.3, -0.646199916), (6.3, 25))
            Line((6.3, 25), (-45.7, 25))
            Line((-45.7, 25), (-45.7, -0.646199916))
            ThreePointArc((-45.7, -0.646199916), (-19.7, -9.790435343), (6.3, -0.646199916))
        make_face()
    extrude(amount=CUT_EXTRUDE_23_DEPTH)


with BuildPart() as body_2_5:
    add(body_2_4.part)

    # 切除-拉伸23: cut by cut_extrude_23_tool
    add(cut_extrude_23_tool.part, mode=Mode.SUBTRACT)

    # 镜向5: body 2 across plane


with BuildPart() as body_3_2_1:
    add(body_3_2.part)

    # 切除-拉伸23: cut by cut_extrude_23_tool
    add(cut_extrude_23_tool.part, mode=Mode.SUBTRACT)


with BuildPart() as body_2_6:
    add(body_2_5.part)
    add(body_2_5.part.mirror(Plane.XY.offset(36)))

    # 草图39 → 切除-拉伸24 (cut)
    with BuildSketch(Plane(origin=(0, 22, 0), x_dir=(1, 0, 0), z_dir=(0, 1, 0))):
        with Locations(Location((19.7, -36, 0), (0, 0, 270))):
            Circle(SKETCH_39_R)
    extrude(amount=-CUT_EXTRUDE_24_DEPTH, mode=Mode.SUBTRACT)

    # 草图41 → 切除-拉伸25 (cut)
    with BuildSketch(Plane(origin=(0, 22, 0), x_dir=(1, 0, 0), z_dir=(0, 1, 0))):
        with Locations(Location((19.7, -23.5, 0), (0, 0, 270))):
            Circle(SKETCH_41_R)
        with Locations(Location((7.2, -36, 0), (0, 0, 270))):
            Circle(SKETCH_41_R)
        with Locations(Location((19.7, -48.5, 0), (0, 0, 270))):
            Circle(SKETCH_41_R)
        with Locations(Location((32.2, -36, 0), (0, 0, 270))):
            Circle(SKETCH_41_R)
    extrude(amount=-CUT_EXTRUDE_25_DEPTH, mode=Mode.SUBTRACT)


with BuildPart() as body_3_3:
    # 镜向6: mirrored copy
    add(part_2.part.mirror(Plane.XY.offset(36)))


with BuildPart() as body_4:
    # 草图40 → 凸台-拉伸17 (new body)
    with BuildSketch(Plane(origin=(0, 0, 61), x_dir=(-1, 0, 0), z_dir=(0, 0, -1))):
        with BuildLine():
            Line((-45.7, 19), (6.3, 19))
            Line((6.3, 19), (6.3, -0.646199916))
            ThreePointArc((6.3, -0.646199916), (-19.7, -9.790435343), (-45.7, -0.646199916))
            Line((-45.7, -0.646199916), (-45.7, 19))
        make_face()
        with Locations((-39.4, 0)):
            Circle(SKETCH_40_R, mode=Mode.SUBTRACT)
        with Locations((-19.7, 0)):
            Circle(SKETCH_40_R_2, mode=Mode.SUBTRACT)
        Circle(SKETCH_40_R, mode=Mode.SUBTRACT)
    extrude(amount=EXTRUDE_17_DEPTH)


solid = Compound([part_2.part, body_2_6.part, body_3_3.part, body_4.part])
